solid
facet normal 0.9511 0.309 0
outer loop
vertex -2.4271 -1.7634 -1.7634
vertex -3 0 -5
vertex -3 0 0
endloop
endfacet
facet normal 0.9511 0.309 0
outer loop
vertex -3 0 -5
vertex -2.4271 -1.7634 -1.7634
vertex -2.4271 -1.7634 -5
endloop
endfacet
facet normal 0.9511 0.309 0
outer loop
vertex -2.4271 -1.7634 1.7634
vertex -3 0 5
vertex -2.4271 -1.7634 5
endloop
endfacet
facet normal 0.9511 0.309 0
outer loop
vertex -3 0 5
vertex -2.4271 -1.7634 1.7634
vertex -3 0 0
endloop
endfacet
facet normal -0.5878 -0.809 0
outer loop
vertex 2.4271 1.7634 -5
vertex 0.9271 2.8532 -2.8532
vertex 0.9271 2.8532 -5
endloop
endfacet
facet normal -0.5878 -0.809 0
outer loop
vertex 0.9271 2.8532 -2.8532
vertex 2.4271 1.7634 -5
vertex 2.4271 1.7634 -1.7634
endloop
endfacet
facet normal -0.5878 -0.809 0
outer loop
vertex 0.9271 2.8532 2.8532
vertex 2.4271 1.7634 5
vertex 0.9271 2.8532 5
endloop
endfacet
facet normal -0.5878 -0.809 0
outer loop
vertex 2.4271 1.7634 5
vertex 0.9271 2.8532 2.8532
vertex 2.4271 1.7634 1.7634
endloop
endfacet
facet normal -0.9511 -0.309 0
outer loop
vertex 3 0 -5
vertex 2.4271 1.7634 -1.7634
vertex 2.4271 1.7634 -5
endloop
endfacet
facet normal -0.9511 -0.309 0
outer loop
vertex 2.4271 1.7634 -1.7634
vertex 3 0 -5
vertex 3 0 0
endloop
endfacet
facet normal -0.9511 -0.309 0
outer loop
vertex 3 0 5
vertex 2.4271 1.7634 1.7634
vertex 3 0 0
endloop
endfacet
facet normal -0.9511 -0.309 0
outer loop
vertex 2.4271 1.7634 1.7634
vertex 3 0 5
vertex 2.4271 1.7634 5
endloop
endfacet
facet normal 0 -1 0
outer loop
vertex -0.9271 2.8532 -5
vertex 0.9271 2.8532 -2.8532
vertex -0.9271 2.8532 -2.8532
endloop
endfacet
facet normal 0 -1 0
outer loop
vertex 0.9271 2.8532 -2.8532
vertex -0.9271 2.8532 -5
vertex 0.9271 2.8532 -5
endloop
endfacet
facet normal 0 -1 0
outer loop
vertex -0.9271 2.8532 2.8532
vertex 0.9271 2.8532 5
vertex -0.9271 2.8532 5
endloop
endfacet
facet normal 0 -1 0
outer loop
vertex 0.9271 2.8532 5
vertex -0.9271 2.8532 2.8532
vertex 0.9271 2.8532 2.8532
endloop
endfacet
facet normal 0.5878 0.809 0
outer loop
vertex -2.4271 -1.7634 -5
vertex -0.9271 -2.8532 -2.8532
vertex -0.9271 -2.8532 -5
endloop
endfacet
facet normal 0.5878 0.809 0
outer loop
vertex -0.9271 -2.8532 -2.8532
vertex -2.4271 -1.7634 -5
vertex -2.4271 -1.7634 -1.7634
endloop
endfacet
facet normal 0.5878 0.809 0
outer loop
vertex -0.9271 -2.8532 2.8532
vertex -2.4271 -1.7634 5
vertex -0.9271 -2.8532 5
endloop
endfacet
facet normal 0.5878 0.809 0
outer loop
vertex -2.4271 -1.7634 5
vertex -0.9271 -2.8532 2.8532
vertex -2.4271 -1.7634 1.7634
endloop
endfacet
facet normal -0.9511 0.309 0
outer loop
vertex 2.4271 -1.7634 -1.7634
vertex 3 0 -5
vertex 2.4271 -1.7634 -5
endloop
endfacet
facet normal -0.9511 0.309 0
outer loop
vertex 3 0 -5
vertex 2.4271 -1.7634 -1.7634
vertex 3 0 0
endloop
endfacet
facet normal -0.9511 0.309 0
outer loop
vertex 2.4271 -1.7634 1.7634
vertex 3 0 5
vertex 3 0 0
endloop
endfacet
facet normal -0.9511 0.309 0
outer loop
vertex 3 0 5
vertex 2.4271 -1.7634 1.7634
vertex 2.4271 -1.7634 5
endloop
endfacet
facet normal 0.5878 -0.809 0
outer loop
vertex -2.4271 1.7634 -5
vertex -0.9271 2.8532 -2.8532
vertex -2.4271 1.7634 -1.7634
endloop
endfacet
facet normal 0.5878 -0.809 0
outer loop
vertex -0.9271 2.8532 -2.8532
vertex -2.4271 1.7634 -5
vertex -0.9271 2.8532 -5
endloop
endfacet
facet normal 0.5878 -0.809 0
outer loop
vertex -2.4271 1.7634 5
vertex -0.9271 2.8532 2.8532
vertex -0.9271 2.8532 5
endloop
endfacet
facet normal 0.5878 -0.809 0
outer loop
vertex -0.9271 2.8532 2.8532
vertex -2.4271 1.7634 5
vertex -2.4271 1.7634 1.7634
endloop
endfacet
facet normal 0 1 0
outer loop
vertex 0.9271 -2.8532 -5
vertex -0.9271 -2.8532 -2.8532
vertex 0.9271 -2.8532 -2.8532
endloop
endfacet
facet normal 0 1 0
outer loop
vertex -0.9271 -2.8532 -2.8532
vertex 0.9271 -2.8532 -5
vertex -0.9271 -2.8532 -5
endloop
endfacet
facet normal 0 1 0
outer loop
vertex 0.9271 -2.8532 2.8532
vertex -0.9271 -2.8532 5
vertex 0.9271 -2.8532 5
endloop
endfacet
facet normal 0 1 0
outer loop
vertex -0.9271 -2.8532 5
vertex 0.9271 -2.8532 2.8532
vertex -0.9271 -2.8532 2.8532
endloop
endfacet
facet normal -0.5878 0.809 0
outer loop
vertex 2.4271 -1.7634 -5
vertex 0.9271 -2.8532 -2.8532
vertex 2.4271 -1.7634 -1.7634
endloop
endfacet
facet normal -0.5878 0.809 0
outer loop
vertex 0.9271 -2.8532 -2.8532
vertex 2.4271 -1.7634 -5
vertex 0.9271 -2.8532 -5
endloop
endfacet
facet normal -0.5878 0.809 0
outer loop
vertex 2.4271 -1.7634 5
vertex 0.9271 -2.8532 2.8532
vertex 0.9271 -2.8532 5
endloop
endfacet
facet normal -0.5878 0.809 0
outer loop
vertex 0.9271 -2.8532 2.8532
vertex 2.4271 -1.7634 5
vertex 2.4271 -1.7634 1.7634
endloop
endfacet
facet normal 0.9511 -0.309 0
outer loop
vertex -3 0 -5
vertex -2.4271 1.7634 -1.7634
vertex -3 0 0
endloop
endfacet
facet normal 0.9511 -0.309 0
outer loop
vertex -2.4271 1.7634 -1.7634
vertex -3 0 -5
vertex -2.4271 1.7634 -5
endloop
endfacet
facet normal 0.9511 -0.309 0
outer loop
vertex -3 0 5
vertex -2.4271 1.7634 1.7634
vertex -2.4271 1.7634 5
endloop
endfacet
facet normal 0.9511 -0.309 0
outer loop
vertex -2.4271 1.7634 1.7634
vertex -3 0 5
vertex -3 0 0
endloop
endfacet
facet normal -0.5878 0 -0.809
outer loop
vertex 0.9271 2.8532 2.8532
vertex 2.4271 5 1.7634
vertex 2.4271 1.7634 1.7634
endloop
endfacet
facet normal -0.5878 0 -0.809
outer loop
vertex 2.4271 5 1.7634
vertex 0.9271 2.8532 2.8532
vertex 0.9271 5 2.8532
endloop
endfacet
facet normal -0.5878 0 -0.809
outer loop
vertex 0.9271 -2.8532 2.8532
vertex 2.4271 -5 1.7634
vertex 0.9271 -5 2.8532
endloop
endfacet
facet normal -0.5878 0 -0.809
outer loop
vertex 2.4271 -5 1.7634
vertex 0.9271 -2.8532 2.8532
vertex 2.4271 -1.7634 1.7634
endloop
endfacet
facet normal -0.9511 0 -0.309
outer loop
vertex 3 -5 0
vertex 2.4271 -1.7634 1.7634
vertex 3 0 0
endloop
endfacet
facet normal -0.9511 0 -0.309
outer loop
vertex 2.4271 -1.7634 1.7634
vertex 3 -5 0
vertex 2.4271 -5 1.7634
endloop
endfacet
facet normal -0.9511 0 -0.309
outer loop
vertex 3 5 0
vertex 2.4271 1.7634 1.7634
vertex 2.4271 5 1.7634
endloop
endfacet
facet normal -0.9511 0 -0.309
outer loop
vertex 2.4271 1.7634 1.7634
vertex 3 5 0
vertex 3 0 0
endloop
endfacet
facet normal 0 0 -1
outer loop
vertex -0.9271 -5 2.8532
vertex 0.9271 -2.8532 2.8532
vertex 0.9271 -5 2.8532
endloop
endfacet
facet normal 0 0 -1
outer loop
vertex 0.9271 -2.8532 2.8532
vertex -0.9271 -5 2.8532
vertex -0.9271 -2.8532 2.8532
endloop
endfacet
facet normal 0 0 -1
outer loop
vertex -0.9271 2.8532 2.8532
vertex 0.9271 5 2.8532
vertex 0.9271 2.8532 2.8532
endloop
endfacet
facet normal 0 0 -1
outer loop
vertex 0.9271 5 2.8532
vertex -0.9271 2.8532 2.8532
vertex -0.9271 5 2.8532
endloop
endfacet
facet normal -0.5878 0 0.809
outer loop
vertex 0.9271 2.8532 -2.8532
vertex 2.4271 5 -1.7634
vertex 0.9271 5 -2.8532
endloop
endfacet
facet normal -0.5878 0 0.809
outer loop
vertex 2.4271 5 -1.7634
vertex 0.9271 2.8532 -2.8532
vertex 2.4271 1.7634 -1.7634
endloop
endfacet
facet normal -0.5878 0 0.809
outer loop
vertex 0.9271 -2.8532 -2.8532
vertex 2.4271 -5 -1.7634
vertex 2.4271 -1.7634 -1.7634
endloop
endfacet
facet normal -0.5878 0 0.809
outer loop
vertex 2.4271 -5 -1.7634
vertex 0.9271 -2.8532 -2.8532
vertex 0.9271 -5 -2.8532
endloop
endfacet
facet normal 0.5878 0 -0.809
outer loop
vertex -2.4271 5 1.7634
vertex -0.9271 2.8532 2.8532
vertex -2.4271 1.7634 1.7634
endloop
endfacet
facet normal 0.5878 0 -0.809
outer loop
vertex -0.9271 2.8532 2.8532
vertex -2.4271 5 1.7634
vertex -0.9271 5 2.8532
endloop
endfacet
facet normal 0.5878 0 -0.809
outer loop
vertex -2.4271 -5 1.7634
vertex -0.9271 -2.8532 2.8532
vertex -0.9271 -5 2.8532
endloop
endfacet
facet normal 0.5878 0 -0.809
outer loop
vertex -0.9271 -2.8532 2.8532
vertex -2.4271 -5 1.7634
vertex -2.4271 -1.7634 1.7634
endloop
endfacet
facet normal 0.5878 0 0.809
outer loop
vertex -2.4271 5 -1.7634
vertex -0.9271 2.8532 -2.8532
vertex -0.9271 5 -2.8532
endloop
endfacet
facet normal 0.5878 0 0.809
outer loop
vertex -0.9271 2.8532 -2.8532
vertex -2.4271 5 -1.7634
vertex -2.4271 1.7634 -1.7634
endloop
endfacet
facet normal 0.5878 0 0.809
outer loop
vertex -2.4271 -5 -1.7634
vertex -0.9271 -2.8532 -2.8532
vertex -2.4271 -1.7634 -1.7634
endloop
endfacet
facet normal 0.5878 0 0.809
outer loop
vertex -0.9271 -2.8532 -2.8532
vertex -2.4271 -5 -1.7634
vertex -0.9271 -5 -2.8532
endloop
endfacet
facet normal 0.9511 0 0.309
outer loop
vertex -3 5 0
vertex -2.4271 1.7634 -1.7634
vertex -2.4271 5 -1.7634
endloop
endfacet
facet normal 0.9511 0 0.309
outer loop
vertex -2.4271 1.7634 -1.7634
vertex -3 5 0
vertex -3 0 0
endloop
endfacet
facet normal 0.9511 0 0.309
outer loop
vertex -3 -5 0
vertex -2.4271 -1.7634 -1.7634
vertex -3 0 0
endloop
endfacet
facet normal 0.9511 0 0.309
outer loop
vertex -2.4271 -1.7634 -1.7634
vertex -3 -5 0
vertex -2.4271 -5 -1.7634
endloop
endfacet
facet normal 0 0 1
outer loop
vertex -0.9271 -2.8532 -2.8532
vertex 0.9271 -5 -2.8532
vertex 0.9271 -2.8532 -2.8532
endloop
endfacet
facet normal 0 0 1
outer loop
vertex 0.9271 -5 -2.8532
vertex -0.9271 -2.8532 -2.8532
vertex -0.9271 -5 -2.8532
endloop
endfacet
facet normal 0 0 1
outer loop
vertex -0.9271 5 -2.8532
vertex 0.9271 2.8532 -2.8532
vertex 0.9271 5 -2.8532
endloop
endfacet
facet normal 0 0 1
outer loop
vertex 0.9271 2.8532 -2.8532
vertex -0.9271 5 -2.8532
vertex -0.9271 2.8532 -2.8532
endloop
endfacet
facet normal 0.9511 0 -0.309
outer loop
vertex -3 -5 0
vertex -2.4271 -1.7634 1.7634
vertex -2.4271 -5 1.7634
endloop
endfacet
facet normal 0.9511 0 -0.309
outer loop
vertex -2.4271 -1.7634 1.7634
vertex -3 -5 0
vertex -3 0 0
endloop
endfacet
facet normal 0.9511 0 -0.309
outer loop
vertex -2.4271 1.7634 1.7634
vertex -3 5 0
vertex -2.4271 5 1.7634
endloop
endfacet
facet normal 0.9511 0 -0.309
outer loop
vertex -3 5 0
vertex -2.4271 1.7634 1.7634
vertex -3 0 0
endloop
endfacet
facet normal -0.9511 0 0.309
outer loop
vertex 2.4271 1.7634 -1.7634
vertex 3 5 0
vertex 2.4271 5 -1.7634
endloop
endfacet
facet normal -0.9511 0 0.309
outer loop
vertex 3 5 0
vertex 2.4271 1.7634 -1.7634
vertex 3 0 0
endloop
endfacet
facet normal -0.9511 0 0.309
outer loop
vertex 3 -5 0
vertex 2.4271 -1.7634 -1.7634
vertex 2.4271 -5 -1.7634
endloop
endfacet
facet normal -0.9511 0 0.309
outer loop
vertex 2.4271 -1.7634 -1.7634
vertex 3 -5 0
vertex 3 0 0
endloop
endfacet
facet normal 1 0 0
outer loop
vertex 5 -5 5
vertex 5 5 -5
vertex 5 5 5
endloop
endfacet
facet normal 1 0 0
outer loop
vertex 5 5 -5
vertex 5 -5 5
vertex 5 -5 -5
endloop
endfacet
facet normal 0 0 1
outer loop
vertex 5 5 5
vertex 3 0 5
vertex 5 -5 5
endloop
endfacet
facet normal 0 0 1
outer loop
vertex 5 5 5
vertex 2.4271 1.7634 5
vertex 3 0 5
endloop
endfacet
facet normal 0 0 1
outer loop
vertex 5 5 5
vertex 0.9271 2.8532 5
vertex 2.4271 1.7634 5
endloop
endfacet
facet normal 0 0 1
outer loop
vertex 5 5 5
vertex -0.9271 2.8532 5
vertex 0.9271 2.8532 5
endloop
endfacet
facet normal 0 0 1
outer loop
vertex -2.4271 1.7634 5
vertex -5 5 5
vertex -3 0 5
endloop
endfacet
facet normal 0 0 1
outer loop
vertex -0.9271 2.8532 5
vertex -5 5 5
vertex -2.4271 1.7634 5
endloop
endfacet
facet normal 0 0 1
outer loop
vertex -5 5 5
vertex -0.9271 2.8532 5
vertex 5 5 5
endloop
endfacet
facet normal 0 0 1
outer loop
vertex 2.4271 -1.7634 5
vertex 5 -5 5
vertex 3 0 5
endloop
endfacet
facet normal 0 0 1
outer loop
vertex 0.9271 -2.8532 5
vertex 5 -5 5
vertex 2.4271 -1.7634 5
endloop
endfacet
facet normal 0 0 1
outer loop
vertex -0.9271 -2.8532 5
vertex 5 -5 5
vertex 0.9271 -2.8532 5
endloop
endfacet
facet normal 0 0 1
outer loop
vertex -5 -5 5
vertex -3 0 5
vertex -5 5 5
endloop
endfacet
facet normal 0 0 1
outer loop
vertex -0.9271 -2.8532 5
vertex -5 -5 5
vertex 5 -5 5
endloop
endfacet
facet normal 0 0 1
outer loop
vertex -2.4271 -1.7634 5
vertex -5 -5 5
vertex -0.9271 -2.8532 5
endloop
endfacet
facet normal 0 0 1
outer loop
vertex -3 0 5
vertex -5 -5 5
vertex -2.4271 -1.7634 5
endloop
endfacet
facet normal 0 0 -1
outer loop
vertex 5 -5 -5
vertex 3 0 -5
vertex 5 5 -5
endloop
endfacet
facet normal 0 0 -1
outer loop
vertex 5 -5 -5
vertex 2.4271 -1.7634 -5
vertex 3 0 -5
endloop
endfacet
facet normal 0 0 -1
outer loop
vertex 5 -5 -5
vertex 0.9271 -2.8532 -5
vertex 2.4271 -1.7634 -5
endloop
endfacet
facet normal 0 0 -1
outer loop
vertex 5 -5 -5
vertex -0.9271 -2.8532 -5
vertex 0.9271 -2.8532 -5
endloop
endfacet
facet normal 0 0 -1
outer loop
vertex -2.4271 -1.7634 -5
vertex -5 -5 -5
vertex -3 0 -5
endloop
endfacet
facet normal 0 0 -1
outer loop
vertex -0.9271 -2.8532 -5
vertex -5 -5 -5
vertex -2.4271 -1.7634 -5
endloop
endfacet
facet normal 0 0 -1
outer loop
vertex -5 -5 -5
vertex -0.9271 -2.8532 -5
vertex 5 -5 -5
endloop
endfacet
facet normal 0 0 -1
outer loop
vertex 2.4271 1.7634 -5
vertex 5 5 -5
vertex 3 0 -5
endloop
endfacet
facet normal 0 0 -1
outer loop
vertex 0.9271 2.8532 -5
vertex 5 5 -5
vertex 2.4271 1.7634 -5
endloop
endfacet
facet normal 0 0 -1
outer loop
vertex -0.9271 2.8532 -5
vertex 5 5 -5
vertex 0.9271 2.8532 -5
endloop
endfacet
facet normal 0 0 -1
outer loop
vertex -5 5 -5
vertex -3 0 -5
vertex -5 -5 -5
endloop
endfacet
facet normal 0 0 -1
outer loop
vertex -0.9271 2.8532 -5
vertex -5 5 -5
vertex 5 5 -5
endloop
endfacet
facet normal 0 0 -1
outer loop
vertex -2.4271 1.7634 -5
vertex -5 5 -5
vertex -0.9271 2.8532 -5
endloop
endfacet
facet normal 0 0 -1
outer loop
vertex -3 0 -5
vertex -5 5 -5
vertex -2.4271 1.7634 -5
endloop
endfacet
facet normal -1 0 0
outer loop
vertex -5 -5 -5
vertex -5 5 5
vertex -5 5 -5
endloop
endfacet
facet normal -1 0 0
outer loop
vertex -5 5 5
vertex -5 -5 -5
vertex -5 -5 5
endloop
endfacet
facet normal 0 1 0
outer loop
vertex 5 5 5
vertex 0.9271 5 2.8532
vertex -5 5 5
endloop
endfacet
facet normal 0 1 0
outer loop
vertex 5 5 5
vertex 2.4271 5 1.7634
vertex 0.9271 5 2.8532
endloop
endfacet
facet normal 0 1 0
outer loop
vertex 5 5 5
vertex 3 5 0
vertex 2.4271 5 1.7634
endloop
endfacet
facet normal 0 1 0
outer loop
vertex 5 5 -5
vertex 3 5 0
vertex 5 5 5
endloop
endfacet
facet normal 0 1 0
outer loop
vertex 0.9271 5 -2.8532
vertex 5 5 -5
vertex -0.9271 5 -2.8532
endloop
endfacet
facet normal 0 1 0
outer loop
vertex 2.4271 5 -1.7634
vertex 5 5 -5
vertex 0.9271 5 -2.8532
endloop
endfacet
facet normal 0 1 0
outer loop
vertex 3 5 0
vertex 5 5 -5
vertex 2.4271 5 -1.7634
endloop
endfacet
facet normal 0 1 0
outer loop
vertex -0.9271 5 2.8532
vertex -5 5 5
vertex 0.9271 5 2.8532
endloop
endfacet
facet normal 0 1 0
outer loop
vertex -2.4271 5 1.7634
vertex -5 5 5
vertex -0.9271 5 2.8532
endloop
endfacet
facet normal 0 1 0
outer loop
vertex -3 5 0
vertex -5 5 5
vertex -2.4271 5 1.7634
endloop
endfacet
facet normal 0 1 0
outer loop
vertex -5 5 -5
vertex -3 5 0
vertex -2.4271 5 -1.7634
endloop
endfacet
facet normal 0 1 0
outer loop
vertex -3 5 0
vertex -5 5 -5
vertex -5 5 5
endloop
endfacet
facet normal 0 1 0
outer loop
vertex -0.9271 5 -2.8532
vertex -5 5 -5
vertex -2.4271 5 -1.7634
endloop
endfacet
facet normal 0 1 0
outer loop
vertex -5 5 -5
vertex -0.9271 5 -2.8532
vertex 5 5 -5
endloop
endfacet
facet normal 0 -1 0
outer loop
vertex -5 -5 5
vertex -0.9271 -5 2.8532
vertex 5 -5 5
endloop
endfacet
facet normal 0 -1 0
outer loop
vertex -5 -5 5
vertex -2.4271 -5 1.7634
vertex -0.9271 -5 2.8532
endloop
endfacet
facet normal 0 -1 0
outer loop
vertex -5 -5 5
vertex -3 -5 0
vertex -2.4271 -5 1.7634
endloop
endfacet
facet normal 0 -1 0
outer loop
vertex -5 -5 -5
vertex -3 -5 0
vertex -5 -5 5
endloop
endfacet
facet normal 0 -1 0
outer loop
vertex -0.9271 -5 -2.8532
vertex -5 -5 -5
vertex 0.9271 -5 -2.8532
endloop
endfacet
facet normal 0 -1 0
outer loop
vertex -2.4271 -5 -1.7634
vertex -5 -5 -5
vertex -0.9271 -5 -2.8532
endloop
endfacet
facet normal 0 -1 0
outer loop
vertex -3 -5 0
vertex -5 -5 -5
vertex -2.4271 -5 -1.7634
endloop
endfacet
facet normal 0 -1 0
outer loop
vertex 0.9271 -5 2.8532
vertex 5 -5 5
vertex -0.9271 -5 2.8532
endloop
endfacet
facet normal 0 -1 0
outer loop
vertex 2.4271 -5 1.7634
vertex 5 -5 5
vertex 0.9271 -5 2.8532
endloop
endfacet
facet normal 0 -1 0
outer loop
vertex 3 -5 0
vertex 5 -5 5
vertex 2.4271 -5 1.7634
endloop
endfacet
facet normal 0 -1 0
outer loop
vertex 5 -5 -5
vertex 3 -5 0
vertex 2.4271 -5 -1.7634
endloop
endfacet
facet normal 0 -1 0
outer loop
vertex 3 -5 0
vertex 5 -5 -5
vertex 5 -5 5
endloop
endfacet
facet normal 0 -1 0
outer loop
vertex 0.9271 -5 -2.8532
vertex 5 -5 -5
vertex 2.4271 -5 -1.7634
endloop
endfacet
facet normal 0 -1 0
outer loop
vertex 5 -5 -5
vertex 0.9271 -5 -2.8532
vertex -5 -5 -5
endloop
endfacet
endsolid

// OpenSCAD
// Module that wraps difference with first child as base
module diff() {
    difference() {
        children(0);
        for (i = [1 : $children - 1]) {
            children(i);
        }
    }
}

diff() {
    cube(10, center = true);
    cylinder(h = 15, r = 3, center = true);
    rotate([90, 0, 0]) cylinder(h = 15, r = 3, center = true);
}
